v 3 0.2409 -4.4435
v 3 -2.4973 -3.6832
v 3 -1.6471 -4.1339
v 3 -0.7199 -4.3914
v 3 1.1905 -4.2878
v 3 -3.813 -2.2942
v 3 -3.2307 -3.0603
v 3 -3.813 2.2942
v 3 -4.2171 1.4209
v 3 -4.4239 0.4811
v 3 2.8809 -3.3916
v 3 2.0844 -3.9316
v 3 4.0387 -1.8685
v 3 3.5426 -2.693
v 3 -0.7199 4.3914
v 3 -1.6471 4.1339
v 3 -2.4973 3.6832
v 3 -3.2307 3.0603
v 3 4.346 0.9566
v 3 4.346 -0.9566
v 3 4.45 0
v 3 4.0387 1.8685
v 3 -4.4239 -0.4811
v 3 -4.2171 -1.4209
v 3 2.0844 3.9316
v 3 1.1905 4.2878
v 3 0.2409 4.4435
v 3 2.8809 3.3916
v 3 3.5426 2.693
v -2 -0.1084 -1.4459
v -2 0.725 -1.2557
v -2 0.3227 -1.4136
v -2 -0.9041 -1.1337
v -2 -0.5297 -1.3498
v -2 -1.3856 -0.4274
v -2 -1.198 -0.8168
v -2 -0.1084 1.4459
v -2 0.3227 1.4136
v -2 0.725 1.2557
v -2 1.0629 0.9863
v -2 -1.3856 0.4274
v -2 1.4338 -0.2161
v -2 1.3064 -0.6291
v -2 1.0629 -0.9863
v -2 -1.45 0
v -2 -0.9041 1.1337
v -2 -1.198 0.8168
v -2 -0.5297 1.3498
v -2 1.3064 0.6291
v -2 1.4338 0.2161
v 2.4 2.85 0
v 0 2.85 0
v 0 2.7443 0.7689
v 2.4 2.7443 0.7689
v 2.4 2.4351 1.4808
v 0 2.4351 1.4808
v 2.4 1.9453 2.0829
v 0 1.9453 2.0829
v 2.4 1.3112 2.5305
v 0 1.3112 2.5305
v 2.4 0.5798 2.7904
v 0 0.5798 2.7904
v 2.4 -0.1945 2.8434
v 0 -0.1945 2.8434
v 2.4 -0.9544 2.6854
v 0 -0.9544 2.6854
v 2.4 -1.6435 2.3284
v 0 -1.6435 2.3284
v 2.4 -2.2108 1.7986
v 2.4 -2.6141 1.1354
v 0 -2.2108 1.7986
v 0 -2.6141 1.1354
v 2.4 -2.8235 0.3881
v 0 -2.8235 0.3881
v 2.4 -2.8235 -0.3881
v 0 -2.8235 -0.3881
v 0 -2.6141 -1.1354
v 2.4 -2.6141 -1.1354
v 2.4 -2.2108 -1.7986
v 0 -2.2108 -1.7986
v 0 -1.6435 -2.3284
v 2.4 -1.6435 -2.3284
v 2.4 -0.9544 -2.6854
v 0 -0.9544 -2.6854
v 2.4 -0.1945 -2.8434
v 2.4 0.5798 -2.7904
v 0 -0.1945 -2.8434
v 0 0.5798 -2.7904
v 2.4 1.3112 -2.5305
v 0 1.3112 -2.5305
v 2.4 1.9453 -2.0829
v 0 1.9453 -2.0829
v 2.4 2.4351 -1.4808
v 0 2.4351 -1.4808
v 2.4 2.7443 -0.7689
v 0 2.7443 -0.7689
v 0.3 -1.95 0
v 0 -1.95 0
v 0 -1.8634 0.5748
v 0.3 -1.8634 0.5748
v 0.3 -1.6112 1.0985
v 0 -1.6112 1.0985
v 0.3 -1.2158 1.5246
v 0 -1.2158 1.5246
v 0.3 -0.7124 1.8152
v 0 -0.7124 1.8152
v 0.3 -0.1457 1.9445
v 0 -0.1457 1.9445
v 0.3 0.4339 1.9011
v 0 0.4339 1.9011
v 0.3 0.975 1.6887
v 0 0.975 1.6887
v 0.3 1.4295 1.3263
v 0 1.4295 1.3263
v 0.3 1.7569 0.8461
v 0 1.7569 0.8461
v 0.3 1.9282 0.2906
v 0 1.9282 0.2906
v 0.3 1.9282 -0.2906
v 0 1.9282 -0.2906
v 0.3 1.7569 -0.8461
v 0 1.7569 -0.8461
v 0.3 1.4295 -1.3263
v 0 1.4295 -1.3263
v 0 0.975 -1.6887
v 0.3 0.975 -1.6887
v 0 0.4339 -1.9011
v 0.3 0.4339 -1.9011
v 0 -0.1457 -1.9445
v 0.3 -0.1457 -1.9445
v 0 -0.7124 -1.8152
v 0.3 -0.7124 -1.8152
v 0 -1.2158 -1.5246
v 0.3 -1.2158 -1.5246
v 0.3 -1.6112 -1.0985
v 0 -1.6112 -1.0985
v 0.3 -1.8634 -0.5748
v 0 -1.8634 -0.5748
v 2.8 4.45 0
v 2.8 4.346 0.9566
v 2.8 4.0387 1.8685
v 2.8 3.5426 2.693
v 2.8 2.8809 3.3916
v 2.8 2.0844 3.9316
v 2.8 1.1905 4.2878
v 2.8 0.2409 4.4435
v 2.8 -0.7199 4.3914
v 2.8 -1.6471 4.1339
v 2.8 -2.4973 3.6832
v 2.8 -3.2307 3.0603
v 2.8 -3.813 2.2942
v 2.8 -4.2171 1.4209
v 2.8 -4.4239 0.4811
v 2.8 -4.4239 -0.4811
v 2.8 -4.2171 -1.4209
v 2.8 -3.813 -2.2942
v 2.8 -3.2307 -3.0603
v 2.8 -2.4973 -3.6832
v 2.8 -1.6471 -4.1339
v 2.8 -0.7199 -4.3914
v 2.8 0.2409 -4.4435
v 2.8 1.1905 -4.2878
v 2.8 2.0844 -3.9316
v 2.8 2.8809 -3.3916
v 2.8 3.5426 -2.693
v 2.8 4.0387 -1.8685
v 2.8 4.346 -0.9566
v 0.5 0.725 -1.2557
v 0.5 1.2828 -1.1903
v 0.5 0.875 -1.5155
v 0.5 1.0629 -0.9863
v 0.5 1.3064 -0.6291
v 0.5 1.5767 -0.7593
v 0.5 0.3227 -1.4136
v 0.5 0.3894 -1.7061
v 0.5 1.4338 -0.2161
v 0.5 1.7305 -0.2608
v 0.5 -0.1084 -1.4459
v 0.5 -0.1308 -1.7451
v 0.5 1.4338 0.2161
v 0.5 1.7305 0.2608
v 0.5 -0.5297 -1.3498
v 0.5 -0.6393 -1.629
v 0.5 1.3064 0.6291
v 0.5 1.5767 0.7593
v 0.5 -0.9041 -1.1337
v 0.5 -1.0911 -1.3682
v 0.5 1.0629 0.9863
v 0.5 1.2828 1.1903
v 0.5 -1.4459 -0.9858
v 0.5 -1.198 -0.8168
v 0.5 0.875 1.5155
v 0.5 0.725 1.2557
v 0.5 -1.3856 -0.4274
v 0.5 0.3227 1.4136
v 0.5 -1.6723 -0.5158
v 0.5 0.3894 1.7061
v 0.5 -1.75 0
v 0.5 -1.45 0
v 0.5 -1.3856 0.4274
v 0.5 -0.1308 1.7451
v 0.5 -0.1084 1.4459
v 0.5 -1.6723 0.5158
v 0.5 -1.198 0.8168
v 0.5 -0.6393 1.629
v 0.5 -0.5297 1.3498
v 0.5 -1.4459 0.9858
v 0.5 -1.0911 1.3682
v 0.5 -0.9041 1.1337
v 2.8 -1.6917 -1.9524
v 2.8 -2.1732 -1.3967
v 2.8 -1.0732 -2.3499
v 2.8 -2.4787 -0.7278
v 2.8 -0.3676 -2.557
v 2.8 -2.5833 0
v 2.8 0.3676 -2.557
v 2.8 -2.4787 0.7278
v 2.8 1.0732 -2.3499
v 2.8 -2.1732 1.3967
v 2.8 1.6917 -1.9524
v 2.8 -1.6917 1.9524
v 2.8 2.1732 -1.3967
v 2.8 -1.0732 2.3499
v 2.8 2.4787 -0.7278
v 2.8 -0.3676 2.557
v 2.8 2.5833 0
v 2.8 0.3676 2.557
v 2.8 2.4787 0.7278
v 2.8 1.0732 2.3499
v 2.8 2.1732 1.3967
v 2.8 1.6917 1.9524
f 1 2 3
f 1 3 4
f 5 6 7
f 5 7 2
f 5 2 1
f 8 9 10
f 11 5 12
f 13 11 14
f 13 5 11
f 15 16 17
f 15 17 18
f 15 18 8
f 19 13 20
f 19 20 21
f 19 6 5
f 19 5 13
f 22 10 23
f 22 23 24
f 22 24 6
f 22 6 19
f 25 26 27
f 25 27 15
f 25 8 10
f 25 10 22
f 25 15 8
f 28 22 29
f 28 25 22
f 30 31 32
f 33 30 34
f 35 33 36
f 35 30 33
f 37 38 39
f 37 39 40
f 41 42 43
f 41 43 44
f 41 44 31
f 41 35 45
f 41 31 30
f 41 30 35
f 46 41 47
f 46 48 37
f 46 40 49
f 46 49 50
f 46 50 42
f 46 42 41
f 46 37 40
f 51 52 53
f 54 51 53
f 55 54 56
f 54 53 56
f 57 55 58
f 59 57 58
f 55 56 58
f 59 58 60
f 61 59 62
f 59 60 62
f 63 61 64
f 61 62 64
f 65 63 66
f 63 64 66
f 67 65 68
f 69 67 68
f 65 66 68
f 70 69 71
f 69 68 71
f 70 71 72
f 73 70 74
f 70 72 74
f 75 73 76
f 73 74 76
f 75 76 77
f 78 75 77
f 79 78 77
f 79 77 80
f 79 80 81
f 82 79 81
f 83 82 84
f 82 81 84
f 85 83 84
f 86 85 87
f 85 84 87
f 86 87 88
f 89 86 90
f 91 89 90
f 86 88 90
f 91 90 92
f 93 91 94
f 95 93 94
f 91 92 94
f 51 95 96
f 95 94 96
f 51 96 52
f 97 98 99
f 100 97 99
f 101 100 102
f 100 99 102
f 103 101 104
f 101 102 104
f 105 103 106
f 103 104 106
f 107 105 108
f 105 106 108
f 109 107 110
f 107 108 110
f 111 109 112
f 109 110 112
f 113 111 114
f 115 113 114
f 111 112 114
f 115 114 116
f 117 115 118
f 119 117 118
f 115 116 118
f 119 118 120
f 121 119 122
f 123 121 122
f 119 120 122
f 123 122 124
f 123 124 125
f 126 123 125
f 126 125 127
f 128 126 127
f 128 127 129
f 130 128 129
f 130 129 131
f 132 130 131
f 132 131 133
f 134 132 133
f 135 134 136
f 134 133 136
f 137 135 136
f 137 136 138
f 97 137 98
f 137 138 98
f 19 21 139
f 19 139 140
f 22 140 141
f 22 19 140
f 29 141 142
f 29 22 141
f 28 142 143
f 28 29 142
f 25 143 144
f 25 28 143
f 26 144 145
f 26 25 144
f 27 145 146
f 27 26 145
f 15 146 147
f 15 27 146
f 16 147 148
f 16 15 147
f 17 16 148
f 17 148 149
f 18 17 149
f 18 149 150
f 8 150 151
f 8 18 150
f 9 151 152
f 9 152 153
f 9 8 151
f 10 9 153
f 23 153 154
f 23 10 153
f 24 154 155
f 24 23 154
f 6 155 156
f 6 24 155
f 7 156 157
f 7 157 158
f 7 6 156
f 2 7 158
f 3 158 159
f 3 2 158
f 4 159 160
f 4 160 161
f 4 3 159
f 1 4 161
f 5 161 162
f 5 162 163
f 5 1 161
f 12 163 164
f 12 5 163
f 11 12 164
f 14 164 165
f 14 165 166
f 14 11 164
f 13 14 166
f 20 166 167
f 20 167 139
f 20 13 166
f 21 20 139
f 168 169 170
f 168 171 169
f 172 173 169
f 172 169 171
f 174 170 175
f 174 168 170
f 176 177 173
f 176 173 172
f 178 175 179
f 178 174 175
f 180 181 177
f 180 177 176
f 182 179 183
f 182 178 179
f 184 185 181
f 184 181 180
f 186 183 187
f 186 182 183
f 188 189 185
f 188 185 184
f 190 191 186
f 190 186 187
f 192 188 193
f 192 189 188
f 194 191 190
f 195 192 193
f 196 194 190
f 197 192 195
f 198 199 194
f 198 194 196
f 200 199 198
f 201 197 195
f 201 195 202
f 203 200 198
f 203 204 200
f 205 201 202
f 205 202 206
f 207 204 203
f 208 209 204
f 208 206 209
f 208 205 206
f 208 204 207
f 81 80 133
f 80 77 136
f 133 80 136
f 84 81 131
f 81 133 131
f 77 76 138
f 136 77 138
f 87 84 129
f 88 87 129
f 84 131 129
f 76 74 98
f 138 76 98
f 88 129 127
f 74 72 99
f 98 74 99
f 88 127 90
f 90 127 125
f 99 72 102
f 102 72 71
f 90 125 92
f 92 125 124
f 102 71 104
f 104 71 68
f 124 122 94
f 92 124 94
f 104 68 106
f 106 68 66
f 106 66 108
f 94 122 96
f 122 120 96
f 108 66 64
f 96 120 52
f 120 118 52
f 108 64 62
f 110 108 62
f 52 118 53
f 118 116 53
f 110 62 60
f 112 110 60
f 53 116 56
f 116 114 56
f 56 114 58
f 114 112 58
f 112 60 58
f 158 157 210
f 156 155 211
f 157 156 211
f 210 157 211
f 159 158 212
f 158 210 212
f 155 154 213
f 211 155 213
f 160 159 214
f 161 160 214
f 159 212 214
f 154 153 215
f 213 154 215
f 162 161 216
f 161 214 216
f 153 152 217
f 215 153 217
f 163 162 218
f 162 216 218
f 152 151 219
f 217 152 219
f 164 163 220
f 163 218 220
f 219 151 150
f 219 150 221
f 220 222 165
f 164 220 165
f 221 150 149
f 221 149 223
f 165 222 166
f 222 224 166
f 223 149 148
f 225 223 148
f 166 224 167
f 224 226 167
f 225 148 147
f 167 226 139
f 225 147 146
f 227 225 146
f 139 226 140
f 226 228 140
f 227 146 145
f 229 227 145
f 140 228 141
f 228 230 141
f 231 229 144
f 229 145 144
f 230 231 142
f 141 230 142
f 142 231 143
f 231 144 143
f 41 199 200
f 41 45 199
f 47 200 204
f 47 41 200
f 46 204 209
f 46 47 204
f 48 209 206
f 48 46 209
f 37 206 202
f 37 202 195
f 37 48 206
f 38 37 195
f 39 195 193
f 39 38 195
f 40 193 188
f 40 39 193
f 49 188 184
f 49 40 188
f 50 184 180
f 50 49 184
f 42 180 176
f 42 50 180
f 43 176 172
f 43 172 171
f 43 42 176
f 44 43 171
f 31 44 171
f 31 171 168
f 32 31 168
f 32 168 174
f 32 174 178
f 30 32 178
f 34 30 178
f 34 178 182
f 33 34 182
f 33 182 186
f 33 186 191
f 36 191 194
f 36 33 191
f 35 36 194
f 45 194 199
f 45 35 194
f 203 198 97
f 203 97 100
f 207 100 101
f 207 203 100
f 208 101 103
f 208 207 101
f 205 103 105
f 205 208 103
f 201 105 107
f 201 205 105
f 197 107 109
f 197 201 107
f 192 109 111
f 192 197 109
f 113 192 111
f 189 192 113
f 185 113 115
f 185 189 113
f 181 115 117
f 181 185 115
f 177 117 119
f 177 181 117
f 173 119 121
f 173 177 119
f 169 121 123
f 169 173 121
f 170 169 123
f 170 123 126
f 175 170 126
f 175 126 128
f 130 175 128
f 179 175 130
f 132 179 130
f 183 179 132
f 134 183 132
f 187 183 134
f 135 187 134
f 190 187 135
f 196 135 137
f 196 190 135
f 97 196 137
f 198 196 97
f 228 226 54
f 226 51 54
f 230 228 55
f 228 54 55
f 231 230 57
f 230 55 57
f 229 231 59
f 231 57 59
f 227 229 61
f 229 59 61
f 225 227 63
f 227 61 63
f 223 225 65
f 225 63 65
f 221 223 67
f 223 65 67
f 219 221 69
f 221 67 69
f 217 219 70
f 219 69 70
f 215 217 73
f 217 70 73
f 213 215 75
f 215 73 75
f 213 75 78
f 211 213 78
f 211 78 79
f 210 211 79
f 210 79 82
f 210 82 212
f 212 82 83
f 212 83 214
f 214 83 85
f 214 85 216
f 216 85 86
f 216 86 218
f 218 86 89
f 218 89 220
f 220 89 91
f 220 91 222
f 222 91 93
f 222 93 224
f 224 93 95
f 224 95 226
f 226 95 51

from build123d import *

# Parameters (mm, degrees)
F0_R     = 2.85
F1_DEPTH = 3
F2_SIZE2 = 0.6
F2_SIZE  = 0.4
F3_R     = 1.45
F4_DEPTH = 2
F5_R     = 1.95
F5_R_2   = 1.45
F6_DEPTH = 0.5
F7_SIZE  = 0.2
F8_R     = 4.45
F8_R_2   = 2.45
F9_DEPTH = 0.2


with BuildPart() as f1:
    # F0 (on Right) → F1 (new body)
    with BuildSketch(Plane.YZ):
        Circle(F0_R)
    extrude(amount=F1_DEPTH)

    # F2
    f2_edges = [f1.edges().sort_by_distance(p)[0] for p in [
        (3, -2.85, 0),
    ]]
    f2_side = f1.faces().sort_by_distance((3, 0, 0))[0]
    chamfer(f2_edges, length=F2_SIZE, length2=F2_SIZE2, reference=f2_side)

    # F3 (on face) → F4 (join)
    with BuildSketch(Plane(origin=(0, 0, 0), x_dir=(0, -1, 0), z_dir=(-1, 0, 0))):
        Circle(F3_R)
    extrude(amount=F4_DEPTH)

    # F5 (on face) → F6 (cut)
    with BuildSketch(Plane(origin=(0, 0, 0), x_dir=(0, -1, 0), z_dir=(-1, 0, 0))):
        Circle(F5_R)
        Circle(F5_R_2, mode=Mode.SUBTRACT)
    extrude(amount=-F6_DEPTH, mode=Mode.SUBTRACT)

    # F7
    f7_edges = [f1.edges().sort_by_distance(p)[0] for p in [
        (0.5, 1.95, 0),
    ]]
    chamfer(f7_edges, length=F7_SIZE)

    # F8 (on face) → F9 (join)
    with BuildSketch(Plane.YZ.offset(3)):
        Circle(F8_R)
        Circle(F8_R_2, mode=Mode.SUBTRACT)
    extrude(amount=-F9_DEPTH)


solid = f1.part
